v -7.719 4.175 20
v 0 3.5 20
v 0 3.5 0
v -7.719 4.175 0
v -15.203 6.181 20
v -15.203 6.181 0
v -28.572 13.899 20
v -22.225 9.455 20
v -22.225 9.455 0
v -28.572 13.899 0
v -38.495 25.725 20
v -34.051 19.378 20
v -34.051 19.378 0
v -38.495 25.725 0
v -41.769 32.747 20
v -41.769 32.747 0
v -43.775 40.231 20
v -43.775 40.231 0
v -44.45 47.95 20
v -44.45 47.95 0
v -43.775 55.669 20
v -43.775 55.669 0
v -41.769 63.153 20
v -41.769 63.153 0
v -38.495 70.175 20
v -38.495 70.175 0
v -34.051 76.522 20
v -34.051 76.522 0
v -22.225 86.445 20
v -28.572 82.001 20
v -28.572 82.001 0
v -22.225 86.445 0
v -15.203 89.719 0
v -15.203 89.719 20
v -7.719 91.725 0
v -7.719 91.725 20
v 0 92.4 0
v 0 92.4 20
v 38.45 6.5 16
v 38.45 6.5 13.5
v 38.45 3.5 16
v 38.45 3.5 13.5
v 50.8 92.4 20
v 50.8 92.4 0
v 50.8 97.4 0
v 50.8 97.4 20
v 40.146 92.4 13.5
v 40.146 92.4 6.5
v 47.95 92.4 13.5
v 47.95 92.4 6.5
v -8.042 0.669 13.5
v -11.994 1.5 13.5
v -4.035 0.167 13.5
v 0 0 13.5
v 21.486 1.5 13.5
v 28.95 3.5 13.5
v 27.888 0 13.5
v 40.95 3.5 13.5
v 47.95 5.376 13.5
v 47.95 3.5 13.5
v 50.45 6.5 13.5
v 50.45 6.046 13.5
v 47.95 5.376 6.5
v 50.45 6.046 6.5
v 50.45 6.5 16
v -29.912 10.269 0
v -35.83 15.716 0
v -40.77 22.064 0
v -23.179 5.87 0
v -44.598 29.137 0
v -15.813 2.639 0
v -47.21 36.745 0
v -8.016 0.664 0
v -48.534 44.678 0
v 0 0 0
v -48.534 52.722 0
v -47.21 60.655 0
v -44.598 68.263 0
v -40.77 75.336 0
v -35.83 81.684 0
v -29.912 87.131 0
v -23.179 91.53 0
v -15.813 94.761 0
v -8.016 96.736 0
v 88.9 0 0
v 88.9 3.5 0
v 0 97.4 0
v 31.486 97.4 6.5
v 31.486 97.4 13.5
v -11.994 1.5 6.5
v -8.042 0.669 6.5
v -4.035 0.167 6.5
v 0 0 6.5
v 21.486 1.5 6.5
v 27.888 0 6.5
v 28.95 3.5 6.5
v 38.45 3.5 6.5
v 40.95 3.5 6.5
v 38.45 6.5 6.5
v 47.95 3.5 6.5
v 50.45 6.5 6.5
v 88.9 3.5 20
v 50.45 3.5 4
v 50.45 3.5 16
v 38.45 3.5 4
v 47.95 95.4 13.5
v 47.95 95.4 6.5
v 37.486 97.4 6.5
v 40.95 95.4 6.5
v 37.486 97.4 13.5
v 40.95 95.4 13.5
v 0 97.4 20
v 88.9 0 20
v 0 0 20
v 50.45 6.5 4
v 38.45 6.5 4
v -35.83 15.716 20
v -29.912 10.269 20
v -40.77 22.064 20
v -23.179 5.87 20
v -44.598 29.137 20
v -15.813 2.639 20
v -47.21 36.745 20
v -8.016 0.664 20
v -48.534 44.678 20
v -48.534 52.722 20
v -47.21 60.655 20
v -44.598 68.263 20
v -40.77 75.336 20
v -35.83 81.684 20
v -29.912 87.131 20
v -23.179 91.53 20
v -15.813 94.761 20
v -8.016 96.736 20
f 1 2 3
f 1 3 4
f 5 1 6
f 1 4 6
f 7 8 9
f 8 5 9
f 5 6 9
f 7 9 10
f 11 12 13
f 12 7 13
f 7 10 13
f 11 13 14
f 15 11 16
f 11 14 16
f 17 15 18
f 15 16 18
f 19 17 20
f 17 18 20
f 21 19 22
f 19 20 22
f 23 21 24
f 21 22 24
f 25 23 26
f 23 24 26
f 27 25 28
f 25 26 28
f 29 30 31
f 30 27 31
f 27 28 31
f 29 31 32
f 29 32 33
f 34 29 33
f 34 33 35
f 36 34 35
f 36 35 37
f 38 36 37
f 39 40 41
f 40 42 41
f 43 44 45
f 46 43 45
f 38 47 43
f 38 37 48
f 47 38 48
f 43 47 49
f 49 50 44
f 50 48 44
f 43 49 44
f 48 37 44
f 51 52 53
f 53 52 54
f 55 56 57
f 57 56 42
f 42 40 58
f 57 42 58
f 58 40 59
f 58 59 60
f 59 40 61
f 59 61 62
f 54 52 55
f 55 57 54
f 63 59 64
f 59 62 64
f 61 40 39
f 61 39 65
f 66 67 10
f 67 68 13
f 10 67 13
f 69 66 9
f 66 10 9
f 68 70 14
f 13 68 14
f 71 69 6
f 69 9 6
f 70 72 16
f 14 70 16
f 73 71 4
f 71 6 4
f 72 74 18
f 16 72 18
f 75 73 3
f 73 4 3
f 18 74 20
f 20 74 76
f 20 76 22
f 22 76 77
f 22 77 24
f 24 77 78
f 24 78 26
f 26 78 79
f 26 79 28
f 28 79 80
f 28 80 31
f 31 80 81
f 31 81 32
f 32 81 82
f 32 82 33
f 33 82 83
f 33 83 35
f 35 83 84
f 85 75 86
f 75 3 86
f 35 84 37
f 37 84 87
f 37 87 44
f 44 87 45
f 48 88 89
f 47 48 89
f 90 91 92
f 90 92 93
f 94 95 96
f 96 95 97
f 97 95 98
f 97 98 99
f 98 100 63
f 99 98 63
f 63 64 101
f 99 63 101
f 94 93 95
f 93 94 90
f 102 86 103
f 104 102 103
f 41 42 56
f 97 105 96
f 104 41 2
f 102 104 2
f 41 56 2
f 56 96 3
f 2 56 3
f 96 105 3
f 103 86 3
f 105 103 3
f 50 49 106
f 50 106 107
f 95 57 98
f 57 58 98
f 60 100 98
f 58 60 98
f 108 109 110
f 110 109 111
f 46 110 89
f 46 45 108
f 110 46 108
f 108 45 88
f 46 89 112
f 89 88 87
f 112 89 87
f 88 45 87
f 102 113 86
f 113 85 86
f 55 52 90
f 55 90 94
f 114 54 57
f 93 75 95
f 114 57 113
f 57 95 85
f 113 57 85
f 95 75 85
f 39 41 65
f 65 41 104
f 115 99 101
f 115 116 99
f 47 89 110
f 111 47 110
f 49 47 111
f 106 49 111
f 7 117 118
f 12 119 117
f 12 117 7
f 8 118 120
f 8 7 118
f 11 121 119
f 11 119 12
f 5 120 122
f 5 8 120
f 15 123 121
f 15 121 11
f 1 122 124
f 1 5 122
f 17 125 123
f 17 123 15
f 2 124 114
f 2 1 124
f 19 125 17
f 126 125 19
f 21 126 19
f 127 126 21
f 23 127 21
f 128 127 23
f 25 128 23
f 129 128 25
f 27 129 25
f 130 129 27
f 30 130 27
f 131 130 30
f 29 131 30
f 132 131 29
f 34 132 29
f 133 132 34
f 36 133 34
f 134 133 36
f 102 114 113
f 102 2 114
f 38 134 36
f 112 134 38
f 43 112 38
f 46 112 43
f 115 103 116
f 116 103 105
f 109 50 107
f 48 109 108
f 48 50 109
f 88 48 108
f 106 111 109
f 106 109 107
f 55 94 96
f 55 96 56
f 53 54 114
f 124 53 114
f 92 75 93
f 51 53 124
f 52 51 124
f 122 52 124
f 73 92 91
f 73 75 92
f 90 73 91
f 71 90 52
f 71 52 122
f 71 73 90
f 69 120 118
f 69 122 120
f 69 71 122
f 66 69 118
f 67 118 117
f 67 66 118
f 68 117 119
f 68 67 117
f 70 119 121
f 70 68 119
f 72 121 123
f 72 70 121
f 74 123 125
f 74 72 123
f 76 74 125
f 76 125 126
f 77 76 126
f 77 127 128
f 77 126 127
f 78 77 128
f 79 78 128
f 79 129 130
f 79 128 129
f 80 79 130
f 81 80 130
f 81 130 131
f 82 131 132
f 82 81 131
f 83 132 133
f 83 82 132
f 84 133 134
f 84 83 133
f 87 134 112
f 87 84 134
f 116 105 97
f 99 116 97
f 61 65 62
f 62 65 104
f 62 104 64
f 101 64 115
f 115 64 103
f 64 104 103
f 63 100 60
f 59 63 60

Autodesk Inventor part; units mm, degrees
ref_plane "YZ Plane" through (0, 0, 0) normal (1, 0, 0) x (0, 1, 0)
ref_plane "XZ Plane" through (0, 0, 0) normal (0, 1, 0) x (-1, 0, 0)
sketch "Sketch1" plane through (0, 0, 0) normal (0, 0, 1) x (1, 0, 0)
  line L0 (0, 0) -> (88.9, 0)
  line L1 (88.9, 0) -> (88.9, 3.5)
  line L2 (88.9, 3.5) -> (0, 3.5)
  line L3 (0, 3.5) -> (0, 0)
  line L4 (0, 92.4) -> (50.8, 92.4)
  line L5 (50.8, 92.4) -> (50.8, 97.4)
  line L6 (50.8, 97.4) -> (0, 97.4)
  line L7 (0, 97.4) -> (0, 92.4)
  arc A0 (0, 92.4) -> (0, 3.5) centre (0, 47.95) ccw
  arc A1 (0, 97.4) -> (0, 0) centre (0, 48.7) ccw
  dimension "d0" = 88.9
  dimension "d1" = 3.5
  dimension "d2" = 50.8
  dimension "d3" = 5
  dimension "d4" = 88.9
extrude "Extrusion1" add sketch "Sketch1" along normal blind 20
sketch "Sketch2" plane through (0, 3.5, 0) normal (0, 1, 0) x (1, 0, 0)
  line L0 (88.9, 0) -> (0, 0) projected
  line L1 (0, 0) -> (0, -20) projected
  line L2 (88.9, -20) -> (0, -20) projected
  line L3 (88.9, 0) -> (88.9, -20) projected
sketch "Sketch3" plane through (0, 92.4, 0) normal (0, -1, 0) x (1, 0, 0)
  line L0 (0, 0) -> (0, 20) projected
  line L1 (47.95, 6.5) -> (40.95, 6.5)
  line L2 (40.95, 6.5) -> (40.95, 13.5)
  line L3 (40.95, 13.5) -> (47.95, 13.5)
  line L4 (47.95, 13.5) -> (47.95, 6.5)
  line L5 (47.95, 6.5) -> (40.95, 13.5) construction
  line L6 (40.95, 6.5) -> (47.95, 13.5) construction
  point P0 (44.45, 10)
  dimension "d8" = 7
  dimension "d9" = 7
  dimension "d10" = 44.45
extrude "Extrusion2" cut sketch "Sketch3" against normal blind 3
ref_plane "Work Plane1" through (40.95, 95.4, 6.5) normal (-0.8660254, 0.5, 0) x (0, 0, 1)
sketch "Sketch4" plane through (40.95, 95.4, 6.5) normal (-0.8660254, 0.5, 0) x (0, 0, 1)
  line L0 (0, 0) -> (7, 0) projected
  line L1 (-6.5, -104.4399) -> (13.5, -104.4399) projected
  line L2 (13.5, -104.4399) -> (13.5, -108.0877) projected
  line L3 (13.5, -108.0877) -> (-6.5, -108.0877) projected
  line L4 (-6.5, -108.0877) -> (-6.5, -104.4399) projected
  line L5 (13.5, -3.4641) -> (-6.5, -3.4641) projected
  line L6 (-6.5, -3.4641) -> (-6.5, 2.3094) projected
  line L7 (-6.5, 2.3094) -> (13.5, 2.3094) projected
  line L8 (13.5, 2.3094) -> (13.5, -3.4641) projected
  line L9 (7, 0) -> (0, 0)
  line L10 (0, 0) -> (0, -3)
  line L11 (0, -3) -> (7, -3)
  line L12 (7, -3) -> (7, 0)
  point P0 (-6.5, -103.0938)
  dimension "d14" = 3
extrude "Extrusion3" cut sketch "Sketch4" along normal through all both and the other way through all contours L0 L12 L11 L10
sketch "Sketch5" plane through (0, 3.5, 0) normal (0, 1, 0) x (1, 0, 0)
  line L0 (0, 0) -> (0, -20) projected
  line L1 (47.95, -13.5) -> (40.95, -13.5)
  line L2 (40.95, -13.5) -> (40.95, -6.5)
  line L3 (40.95, -6.5) -> (47.95, -6.5)
  line L4 (47.95, -6.5) -> (47.95, -13.5)
  line L5 (47.95, -13.5) -> (40.95, -6.5) construction
  line L6 (40.95, -13.5) -> (47.95, -6.5) construction
  line L7 (38.45, -16) -> (50.45, -16)
  line L8 (50.45, -16) -> (50.45, -4)
  line L9 (50.45, -4) -> (38.45, -4)
  line L10 (38.45, -4) -> (38.45, -16)
  line L11 (38.45, -16) -> (50.45, -4) construction
  line L12 (50.45, -16) -> (38.45, -4) construction
  point P0 (44.45, -10)
  dimension "d17" = 7
  dimension "d18" = 7
  dimension "d19" = 44.45
  dimension "d20" = 12
  dimension "d21" = 12
extrude "Extrusion4" add sketch "Sketch5" along normal blind 3
ref_plane "Work Plane2" through (40.95, 3.5, 3.25) normal (-0.9659258, -0.258819, 0) x (0, 0, 1)
sketch "Sketch6" plane through (40.95, 3.5, 3.25) normal (-0.9659258, -0.258819, 0) x (0, 0, 1)
  line L0 (10.25, 0) -> (3.25, 0) projected
  line L1 (16.75, -3.6235) -> (-3.25, -3.6235) projected
  line L2 (-3.25, -3.6235) -> (-3.25, 0) projected
  line L3 (-3.25, 0) -> (0.75, 0) projected
  line L4 (0.75, 0) -> (0.75, 3.1058) projected
  line L5 (0.75, 3.1058) -> (12.75, 3.1058) projected
  line L6 (12.75, 3.1058) -> (12.75, 0) projected
  line L7 (12.75, 0) -> (16.75, 0) projected
  line L8 (16.75, 0) -> (16.75, -3.6235) projected
  line L9 (16.75, 92.0361) -> (-3.25, 92.0361) projected
  line L10 (-3.25, 92.0361) -> (-3.25, 97.2124) projected
  line L11 (-3.25, 97.2124) -> (16.75, 97.2124) projected
  line L12 (16.75, 97.2124) -> (16.75, 92.0361) projected
  line L13 (10.25, 0) -> (3.25, 0)
  line L14 (3.25, 0) -> (3.25, 3.1058)
  line L15 (3.25, 3.1058) -> (10.25, 3.1058)
  line L16 (10.25, 3.1058) -> (10.25, 0)
  point P0 (-3.25, 7.2179)
extrude "Extrusion5" cut sketch "Sketch6" along normal through all both and the other way through all contours L0 L14 L5 L16
sketch "Sketch7" plane through (0, 6.5, 0) normal (0, 1, 0) x (1, 0, 0)
  line L0 (40.1462, -13.5) -> (40.1462, -6.5) projected
  line L1 (38.45, -4) -> (38.45, -16) projected
  line L2 (38.45, -16) -> (38.45, -4) projected
  line L3 (38.45, -4) -> (50.45, -4) projected
  line L4 (50.45, -4) -> (50.45, -6.5) projected
  line L5 (50.45, -6.5) -> (40.1462, -6.5) projected
  line L6 (40.1462, -6.5) -> (40.1462, -13.5) projected
  line L7 (40.1462, -13.5) -> (50.45, -13.5) projected
  line L8 (50.45, -13.5) -> (50.45, -16) projected
  line L9 (50.45, -16) -> (38.45, -16) projected
  line L10 (-16.053, 0) -> (-16.053, -20) projected
  line L11 (-16.053, -20) -> (-24.3074, -20) projected
  line L12 (-24.3074, -20) -> (-24.3074, 0) projected
  line L13 (-24.3074, 0) -> (-16.053, 0) projected
  line L14 (40.1462, -13.5) -> (38.45, -13.5) projected
  line L15 (40.1462, -6.5) -> (38.45, -6.5) projected
  point P0 (0, 0)
extrude "Extrusion6" cut sketch "Sketch7" against normal blind 3 contours L14 L1 L15 L0
sketch "Sketch8" plane through (0, 0, 0) normal (0, -1, 0) x (1, 0, 0)
  line L0 (27.8878, 13.5) -> (27.8878, 6.5) projected
  line L1 (27.8878, 6.5) -> (15.8878, 6.5) projected
  line L2 (15.8878, 6.5) -> (15.8878, 13.5) projected
  line L3 (15.8878, 13.5) -> (27.8878, 13.5) projected
  line L4 (15.8878, 13.5) -> (-12.9863, 13.5)
  line L5 (-12.9863, 13.5) -> (-12.9863, 6.5)
  line L6 (-12.9863, 6.5) -> (15.8878, 6.5)
  line L7 (15.8878, 6.5) -> (15.8878, 13.5)
extrude "Extrusion7" cut sketch "Sketch8" against normal blind 1.5
properties part number "PinewoodFinish"
